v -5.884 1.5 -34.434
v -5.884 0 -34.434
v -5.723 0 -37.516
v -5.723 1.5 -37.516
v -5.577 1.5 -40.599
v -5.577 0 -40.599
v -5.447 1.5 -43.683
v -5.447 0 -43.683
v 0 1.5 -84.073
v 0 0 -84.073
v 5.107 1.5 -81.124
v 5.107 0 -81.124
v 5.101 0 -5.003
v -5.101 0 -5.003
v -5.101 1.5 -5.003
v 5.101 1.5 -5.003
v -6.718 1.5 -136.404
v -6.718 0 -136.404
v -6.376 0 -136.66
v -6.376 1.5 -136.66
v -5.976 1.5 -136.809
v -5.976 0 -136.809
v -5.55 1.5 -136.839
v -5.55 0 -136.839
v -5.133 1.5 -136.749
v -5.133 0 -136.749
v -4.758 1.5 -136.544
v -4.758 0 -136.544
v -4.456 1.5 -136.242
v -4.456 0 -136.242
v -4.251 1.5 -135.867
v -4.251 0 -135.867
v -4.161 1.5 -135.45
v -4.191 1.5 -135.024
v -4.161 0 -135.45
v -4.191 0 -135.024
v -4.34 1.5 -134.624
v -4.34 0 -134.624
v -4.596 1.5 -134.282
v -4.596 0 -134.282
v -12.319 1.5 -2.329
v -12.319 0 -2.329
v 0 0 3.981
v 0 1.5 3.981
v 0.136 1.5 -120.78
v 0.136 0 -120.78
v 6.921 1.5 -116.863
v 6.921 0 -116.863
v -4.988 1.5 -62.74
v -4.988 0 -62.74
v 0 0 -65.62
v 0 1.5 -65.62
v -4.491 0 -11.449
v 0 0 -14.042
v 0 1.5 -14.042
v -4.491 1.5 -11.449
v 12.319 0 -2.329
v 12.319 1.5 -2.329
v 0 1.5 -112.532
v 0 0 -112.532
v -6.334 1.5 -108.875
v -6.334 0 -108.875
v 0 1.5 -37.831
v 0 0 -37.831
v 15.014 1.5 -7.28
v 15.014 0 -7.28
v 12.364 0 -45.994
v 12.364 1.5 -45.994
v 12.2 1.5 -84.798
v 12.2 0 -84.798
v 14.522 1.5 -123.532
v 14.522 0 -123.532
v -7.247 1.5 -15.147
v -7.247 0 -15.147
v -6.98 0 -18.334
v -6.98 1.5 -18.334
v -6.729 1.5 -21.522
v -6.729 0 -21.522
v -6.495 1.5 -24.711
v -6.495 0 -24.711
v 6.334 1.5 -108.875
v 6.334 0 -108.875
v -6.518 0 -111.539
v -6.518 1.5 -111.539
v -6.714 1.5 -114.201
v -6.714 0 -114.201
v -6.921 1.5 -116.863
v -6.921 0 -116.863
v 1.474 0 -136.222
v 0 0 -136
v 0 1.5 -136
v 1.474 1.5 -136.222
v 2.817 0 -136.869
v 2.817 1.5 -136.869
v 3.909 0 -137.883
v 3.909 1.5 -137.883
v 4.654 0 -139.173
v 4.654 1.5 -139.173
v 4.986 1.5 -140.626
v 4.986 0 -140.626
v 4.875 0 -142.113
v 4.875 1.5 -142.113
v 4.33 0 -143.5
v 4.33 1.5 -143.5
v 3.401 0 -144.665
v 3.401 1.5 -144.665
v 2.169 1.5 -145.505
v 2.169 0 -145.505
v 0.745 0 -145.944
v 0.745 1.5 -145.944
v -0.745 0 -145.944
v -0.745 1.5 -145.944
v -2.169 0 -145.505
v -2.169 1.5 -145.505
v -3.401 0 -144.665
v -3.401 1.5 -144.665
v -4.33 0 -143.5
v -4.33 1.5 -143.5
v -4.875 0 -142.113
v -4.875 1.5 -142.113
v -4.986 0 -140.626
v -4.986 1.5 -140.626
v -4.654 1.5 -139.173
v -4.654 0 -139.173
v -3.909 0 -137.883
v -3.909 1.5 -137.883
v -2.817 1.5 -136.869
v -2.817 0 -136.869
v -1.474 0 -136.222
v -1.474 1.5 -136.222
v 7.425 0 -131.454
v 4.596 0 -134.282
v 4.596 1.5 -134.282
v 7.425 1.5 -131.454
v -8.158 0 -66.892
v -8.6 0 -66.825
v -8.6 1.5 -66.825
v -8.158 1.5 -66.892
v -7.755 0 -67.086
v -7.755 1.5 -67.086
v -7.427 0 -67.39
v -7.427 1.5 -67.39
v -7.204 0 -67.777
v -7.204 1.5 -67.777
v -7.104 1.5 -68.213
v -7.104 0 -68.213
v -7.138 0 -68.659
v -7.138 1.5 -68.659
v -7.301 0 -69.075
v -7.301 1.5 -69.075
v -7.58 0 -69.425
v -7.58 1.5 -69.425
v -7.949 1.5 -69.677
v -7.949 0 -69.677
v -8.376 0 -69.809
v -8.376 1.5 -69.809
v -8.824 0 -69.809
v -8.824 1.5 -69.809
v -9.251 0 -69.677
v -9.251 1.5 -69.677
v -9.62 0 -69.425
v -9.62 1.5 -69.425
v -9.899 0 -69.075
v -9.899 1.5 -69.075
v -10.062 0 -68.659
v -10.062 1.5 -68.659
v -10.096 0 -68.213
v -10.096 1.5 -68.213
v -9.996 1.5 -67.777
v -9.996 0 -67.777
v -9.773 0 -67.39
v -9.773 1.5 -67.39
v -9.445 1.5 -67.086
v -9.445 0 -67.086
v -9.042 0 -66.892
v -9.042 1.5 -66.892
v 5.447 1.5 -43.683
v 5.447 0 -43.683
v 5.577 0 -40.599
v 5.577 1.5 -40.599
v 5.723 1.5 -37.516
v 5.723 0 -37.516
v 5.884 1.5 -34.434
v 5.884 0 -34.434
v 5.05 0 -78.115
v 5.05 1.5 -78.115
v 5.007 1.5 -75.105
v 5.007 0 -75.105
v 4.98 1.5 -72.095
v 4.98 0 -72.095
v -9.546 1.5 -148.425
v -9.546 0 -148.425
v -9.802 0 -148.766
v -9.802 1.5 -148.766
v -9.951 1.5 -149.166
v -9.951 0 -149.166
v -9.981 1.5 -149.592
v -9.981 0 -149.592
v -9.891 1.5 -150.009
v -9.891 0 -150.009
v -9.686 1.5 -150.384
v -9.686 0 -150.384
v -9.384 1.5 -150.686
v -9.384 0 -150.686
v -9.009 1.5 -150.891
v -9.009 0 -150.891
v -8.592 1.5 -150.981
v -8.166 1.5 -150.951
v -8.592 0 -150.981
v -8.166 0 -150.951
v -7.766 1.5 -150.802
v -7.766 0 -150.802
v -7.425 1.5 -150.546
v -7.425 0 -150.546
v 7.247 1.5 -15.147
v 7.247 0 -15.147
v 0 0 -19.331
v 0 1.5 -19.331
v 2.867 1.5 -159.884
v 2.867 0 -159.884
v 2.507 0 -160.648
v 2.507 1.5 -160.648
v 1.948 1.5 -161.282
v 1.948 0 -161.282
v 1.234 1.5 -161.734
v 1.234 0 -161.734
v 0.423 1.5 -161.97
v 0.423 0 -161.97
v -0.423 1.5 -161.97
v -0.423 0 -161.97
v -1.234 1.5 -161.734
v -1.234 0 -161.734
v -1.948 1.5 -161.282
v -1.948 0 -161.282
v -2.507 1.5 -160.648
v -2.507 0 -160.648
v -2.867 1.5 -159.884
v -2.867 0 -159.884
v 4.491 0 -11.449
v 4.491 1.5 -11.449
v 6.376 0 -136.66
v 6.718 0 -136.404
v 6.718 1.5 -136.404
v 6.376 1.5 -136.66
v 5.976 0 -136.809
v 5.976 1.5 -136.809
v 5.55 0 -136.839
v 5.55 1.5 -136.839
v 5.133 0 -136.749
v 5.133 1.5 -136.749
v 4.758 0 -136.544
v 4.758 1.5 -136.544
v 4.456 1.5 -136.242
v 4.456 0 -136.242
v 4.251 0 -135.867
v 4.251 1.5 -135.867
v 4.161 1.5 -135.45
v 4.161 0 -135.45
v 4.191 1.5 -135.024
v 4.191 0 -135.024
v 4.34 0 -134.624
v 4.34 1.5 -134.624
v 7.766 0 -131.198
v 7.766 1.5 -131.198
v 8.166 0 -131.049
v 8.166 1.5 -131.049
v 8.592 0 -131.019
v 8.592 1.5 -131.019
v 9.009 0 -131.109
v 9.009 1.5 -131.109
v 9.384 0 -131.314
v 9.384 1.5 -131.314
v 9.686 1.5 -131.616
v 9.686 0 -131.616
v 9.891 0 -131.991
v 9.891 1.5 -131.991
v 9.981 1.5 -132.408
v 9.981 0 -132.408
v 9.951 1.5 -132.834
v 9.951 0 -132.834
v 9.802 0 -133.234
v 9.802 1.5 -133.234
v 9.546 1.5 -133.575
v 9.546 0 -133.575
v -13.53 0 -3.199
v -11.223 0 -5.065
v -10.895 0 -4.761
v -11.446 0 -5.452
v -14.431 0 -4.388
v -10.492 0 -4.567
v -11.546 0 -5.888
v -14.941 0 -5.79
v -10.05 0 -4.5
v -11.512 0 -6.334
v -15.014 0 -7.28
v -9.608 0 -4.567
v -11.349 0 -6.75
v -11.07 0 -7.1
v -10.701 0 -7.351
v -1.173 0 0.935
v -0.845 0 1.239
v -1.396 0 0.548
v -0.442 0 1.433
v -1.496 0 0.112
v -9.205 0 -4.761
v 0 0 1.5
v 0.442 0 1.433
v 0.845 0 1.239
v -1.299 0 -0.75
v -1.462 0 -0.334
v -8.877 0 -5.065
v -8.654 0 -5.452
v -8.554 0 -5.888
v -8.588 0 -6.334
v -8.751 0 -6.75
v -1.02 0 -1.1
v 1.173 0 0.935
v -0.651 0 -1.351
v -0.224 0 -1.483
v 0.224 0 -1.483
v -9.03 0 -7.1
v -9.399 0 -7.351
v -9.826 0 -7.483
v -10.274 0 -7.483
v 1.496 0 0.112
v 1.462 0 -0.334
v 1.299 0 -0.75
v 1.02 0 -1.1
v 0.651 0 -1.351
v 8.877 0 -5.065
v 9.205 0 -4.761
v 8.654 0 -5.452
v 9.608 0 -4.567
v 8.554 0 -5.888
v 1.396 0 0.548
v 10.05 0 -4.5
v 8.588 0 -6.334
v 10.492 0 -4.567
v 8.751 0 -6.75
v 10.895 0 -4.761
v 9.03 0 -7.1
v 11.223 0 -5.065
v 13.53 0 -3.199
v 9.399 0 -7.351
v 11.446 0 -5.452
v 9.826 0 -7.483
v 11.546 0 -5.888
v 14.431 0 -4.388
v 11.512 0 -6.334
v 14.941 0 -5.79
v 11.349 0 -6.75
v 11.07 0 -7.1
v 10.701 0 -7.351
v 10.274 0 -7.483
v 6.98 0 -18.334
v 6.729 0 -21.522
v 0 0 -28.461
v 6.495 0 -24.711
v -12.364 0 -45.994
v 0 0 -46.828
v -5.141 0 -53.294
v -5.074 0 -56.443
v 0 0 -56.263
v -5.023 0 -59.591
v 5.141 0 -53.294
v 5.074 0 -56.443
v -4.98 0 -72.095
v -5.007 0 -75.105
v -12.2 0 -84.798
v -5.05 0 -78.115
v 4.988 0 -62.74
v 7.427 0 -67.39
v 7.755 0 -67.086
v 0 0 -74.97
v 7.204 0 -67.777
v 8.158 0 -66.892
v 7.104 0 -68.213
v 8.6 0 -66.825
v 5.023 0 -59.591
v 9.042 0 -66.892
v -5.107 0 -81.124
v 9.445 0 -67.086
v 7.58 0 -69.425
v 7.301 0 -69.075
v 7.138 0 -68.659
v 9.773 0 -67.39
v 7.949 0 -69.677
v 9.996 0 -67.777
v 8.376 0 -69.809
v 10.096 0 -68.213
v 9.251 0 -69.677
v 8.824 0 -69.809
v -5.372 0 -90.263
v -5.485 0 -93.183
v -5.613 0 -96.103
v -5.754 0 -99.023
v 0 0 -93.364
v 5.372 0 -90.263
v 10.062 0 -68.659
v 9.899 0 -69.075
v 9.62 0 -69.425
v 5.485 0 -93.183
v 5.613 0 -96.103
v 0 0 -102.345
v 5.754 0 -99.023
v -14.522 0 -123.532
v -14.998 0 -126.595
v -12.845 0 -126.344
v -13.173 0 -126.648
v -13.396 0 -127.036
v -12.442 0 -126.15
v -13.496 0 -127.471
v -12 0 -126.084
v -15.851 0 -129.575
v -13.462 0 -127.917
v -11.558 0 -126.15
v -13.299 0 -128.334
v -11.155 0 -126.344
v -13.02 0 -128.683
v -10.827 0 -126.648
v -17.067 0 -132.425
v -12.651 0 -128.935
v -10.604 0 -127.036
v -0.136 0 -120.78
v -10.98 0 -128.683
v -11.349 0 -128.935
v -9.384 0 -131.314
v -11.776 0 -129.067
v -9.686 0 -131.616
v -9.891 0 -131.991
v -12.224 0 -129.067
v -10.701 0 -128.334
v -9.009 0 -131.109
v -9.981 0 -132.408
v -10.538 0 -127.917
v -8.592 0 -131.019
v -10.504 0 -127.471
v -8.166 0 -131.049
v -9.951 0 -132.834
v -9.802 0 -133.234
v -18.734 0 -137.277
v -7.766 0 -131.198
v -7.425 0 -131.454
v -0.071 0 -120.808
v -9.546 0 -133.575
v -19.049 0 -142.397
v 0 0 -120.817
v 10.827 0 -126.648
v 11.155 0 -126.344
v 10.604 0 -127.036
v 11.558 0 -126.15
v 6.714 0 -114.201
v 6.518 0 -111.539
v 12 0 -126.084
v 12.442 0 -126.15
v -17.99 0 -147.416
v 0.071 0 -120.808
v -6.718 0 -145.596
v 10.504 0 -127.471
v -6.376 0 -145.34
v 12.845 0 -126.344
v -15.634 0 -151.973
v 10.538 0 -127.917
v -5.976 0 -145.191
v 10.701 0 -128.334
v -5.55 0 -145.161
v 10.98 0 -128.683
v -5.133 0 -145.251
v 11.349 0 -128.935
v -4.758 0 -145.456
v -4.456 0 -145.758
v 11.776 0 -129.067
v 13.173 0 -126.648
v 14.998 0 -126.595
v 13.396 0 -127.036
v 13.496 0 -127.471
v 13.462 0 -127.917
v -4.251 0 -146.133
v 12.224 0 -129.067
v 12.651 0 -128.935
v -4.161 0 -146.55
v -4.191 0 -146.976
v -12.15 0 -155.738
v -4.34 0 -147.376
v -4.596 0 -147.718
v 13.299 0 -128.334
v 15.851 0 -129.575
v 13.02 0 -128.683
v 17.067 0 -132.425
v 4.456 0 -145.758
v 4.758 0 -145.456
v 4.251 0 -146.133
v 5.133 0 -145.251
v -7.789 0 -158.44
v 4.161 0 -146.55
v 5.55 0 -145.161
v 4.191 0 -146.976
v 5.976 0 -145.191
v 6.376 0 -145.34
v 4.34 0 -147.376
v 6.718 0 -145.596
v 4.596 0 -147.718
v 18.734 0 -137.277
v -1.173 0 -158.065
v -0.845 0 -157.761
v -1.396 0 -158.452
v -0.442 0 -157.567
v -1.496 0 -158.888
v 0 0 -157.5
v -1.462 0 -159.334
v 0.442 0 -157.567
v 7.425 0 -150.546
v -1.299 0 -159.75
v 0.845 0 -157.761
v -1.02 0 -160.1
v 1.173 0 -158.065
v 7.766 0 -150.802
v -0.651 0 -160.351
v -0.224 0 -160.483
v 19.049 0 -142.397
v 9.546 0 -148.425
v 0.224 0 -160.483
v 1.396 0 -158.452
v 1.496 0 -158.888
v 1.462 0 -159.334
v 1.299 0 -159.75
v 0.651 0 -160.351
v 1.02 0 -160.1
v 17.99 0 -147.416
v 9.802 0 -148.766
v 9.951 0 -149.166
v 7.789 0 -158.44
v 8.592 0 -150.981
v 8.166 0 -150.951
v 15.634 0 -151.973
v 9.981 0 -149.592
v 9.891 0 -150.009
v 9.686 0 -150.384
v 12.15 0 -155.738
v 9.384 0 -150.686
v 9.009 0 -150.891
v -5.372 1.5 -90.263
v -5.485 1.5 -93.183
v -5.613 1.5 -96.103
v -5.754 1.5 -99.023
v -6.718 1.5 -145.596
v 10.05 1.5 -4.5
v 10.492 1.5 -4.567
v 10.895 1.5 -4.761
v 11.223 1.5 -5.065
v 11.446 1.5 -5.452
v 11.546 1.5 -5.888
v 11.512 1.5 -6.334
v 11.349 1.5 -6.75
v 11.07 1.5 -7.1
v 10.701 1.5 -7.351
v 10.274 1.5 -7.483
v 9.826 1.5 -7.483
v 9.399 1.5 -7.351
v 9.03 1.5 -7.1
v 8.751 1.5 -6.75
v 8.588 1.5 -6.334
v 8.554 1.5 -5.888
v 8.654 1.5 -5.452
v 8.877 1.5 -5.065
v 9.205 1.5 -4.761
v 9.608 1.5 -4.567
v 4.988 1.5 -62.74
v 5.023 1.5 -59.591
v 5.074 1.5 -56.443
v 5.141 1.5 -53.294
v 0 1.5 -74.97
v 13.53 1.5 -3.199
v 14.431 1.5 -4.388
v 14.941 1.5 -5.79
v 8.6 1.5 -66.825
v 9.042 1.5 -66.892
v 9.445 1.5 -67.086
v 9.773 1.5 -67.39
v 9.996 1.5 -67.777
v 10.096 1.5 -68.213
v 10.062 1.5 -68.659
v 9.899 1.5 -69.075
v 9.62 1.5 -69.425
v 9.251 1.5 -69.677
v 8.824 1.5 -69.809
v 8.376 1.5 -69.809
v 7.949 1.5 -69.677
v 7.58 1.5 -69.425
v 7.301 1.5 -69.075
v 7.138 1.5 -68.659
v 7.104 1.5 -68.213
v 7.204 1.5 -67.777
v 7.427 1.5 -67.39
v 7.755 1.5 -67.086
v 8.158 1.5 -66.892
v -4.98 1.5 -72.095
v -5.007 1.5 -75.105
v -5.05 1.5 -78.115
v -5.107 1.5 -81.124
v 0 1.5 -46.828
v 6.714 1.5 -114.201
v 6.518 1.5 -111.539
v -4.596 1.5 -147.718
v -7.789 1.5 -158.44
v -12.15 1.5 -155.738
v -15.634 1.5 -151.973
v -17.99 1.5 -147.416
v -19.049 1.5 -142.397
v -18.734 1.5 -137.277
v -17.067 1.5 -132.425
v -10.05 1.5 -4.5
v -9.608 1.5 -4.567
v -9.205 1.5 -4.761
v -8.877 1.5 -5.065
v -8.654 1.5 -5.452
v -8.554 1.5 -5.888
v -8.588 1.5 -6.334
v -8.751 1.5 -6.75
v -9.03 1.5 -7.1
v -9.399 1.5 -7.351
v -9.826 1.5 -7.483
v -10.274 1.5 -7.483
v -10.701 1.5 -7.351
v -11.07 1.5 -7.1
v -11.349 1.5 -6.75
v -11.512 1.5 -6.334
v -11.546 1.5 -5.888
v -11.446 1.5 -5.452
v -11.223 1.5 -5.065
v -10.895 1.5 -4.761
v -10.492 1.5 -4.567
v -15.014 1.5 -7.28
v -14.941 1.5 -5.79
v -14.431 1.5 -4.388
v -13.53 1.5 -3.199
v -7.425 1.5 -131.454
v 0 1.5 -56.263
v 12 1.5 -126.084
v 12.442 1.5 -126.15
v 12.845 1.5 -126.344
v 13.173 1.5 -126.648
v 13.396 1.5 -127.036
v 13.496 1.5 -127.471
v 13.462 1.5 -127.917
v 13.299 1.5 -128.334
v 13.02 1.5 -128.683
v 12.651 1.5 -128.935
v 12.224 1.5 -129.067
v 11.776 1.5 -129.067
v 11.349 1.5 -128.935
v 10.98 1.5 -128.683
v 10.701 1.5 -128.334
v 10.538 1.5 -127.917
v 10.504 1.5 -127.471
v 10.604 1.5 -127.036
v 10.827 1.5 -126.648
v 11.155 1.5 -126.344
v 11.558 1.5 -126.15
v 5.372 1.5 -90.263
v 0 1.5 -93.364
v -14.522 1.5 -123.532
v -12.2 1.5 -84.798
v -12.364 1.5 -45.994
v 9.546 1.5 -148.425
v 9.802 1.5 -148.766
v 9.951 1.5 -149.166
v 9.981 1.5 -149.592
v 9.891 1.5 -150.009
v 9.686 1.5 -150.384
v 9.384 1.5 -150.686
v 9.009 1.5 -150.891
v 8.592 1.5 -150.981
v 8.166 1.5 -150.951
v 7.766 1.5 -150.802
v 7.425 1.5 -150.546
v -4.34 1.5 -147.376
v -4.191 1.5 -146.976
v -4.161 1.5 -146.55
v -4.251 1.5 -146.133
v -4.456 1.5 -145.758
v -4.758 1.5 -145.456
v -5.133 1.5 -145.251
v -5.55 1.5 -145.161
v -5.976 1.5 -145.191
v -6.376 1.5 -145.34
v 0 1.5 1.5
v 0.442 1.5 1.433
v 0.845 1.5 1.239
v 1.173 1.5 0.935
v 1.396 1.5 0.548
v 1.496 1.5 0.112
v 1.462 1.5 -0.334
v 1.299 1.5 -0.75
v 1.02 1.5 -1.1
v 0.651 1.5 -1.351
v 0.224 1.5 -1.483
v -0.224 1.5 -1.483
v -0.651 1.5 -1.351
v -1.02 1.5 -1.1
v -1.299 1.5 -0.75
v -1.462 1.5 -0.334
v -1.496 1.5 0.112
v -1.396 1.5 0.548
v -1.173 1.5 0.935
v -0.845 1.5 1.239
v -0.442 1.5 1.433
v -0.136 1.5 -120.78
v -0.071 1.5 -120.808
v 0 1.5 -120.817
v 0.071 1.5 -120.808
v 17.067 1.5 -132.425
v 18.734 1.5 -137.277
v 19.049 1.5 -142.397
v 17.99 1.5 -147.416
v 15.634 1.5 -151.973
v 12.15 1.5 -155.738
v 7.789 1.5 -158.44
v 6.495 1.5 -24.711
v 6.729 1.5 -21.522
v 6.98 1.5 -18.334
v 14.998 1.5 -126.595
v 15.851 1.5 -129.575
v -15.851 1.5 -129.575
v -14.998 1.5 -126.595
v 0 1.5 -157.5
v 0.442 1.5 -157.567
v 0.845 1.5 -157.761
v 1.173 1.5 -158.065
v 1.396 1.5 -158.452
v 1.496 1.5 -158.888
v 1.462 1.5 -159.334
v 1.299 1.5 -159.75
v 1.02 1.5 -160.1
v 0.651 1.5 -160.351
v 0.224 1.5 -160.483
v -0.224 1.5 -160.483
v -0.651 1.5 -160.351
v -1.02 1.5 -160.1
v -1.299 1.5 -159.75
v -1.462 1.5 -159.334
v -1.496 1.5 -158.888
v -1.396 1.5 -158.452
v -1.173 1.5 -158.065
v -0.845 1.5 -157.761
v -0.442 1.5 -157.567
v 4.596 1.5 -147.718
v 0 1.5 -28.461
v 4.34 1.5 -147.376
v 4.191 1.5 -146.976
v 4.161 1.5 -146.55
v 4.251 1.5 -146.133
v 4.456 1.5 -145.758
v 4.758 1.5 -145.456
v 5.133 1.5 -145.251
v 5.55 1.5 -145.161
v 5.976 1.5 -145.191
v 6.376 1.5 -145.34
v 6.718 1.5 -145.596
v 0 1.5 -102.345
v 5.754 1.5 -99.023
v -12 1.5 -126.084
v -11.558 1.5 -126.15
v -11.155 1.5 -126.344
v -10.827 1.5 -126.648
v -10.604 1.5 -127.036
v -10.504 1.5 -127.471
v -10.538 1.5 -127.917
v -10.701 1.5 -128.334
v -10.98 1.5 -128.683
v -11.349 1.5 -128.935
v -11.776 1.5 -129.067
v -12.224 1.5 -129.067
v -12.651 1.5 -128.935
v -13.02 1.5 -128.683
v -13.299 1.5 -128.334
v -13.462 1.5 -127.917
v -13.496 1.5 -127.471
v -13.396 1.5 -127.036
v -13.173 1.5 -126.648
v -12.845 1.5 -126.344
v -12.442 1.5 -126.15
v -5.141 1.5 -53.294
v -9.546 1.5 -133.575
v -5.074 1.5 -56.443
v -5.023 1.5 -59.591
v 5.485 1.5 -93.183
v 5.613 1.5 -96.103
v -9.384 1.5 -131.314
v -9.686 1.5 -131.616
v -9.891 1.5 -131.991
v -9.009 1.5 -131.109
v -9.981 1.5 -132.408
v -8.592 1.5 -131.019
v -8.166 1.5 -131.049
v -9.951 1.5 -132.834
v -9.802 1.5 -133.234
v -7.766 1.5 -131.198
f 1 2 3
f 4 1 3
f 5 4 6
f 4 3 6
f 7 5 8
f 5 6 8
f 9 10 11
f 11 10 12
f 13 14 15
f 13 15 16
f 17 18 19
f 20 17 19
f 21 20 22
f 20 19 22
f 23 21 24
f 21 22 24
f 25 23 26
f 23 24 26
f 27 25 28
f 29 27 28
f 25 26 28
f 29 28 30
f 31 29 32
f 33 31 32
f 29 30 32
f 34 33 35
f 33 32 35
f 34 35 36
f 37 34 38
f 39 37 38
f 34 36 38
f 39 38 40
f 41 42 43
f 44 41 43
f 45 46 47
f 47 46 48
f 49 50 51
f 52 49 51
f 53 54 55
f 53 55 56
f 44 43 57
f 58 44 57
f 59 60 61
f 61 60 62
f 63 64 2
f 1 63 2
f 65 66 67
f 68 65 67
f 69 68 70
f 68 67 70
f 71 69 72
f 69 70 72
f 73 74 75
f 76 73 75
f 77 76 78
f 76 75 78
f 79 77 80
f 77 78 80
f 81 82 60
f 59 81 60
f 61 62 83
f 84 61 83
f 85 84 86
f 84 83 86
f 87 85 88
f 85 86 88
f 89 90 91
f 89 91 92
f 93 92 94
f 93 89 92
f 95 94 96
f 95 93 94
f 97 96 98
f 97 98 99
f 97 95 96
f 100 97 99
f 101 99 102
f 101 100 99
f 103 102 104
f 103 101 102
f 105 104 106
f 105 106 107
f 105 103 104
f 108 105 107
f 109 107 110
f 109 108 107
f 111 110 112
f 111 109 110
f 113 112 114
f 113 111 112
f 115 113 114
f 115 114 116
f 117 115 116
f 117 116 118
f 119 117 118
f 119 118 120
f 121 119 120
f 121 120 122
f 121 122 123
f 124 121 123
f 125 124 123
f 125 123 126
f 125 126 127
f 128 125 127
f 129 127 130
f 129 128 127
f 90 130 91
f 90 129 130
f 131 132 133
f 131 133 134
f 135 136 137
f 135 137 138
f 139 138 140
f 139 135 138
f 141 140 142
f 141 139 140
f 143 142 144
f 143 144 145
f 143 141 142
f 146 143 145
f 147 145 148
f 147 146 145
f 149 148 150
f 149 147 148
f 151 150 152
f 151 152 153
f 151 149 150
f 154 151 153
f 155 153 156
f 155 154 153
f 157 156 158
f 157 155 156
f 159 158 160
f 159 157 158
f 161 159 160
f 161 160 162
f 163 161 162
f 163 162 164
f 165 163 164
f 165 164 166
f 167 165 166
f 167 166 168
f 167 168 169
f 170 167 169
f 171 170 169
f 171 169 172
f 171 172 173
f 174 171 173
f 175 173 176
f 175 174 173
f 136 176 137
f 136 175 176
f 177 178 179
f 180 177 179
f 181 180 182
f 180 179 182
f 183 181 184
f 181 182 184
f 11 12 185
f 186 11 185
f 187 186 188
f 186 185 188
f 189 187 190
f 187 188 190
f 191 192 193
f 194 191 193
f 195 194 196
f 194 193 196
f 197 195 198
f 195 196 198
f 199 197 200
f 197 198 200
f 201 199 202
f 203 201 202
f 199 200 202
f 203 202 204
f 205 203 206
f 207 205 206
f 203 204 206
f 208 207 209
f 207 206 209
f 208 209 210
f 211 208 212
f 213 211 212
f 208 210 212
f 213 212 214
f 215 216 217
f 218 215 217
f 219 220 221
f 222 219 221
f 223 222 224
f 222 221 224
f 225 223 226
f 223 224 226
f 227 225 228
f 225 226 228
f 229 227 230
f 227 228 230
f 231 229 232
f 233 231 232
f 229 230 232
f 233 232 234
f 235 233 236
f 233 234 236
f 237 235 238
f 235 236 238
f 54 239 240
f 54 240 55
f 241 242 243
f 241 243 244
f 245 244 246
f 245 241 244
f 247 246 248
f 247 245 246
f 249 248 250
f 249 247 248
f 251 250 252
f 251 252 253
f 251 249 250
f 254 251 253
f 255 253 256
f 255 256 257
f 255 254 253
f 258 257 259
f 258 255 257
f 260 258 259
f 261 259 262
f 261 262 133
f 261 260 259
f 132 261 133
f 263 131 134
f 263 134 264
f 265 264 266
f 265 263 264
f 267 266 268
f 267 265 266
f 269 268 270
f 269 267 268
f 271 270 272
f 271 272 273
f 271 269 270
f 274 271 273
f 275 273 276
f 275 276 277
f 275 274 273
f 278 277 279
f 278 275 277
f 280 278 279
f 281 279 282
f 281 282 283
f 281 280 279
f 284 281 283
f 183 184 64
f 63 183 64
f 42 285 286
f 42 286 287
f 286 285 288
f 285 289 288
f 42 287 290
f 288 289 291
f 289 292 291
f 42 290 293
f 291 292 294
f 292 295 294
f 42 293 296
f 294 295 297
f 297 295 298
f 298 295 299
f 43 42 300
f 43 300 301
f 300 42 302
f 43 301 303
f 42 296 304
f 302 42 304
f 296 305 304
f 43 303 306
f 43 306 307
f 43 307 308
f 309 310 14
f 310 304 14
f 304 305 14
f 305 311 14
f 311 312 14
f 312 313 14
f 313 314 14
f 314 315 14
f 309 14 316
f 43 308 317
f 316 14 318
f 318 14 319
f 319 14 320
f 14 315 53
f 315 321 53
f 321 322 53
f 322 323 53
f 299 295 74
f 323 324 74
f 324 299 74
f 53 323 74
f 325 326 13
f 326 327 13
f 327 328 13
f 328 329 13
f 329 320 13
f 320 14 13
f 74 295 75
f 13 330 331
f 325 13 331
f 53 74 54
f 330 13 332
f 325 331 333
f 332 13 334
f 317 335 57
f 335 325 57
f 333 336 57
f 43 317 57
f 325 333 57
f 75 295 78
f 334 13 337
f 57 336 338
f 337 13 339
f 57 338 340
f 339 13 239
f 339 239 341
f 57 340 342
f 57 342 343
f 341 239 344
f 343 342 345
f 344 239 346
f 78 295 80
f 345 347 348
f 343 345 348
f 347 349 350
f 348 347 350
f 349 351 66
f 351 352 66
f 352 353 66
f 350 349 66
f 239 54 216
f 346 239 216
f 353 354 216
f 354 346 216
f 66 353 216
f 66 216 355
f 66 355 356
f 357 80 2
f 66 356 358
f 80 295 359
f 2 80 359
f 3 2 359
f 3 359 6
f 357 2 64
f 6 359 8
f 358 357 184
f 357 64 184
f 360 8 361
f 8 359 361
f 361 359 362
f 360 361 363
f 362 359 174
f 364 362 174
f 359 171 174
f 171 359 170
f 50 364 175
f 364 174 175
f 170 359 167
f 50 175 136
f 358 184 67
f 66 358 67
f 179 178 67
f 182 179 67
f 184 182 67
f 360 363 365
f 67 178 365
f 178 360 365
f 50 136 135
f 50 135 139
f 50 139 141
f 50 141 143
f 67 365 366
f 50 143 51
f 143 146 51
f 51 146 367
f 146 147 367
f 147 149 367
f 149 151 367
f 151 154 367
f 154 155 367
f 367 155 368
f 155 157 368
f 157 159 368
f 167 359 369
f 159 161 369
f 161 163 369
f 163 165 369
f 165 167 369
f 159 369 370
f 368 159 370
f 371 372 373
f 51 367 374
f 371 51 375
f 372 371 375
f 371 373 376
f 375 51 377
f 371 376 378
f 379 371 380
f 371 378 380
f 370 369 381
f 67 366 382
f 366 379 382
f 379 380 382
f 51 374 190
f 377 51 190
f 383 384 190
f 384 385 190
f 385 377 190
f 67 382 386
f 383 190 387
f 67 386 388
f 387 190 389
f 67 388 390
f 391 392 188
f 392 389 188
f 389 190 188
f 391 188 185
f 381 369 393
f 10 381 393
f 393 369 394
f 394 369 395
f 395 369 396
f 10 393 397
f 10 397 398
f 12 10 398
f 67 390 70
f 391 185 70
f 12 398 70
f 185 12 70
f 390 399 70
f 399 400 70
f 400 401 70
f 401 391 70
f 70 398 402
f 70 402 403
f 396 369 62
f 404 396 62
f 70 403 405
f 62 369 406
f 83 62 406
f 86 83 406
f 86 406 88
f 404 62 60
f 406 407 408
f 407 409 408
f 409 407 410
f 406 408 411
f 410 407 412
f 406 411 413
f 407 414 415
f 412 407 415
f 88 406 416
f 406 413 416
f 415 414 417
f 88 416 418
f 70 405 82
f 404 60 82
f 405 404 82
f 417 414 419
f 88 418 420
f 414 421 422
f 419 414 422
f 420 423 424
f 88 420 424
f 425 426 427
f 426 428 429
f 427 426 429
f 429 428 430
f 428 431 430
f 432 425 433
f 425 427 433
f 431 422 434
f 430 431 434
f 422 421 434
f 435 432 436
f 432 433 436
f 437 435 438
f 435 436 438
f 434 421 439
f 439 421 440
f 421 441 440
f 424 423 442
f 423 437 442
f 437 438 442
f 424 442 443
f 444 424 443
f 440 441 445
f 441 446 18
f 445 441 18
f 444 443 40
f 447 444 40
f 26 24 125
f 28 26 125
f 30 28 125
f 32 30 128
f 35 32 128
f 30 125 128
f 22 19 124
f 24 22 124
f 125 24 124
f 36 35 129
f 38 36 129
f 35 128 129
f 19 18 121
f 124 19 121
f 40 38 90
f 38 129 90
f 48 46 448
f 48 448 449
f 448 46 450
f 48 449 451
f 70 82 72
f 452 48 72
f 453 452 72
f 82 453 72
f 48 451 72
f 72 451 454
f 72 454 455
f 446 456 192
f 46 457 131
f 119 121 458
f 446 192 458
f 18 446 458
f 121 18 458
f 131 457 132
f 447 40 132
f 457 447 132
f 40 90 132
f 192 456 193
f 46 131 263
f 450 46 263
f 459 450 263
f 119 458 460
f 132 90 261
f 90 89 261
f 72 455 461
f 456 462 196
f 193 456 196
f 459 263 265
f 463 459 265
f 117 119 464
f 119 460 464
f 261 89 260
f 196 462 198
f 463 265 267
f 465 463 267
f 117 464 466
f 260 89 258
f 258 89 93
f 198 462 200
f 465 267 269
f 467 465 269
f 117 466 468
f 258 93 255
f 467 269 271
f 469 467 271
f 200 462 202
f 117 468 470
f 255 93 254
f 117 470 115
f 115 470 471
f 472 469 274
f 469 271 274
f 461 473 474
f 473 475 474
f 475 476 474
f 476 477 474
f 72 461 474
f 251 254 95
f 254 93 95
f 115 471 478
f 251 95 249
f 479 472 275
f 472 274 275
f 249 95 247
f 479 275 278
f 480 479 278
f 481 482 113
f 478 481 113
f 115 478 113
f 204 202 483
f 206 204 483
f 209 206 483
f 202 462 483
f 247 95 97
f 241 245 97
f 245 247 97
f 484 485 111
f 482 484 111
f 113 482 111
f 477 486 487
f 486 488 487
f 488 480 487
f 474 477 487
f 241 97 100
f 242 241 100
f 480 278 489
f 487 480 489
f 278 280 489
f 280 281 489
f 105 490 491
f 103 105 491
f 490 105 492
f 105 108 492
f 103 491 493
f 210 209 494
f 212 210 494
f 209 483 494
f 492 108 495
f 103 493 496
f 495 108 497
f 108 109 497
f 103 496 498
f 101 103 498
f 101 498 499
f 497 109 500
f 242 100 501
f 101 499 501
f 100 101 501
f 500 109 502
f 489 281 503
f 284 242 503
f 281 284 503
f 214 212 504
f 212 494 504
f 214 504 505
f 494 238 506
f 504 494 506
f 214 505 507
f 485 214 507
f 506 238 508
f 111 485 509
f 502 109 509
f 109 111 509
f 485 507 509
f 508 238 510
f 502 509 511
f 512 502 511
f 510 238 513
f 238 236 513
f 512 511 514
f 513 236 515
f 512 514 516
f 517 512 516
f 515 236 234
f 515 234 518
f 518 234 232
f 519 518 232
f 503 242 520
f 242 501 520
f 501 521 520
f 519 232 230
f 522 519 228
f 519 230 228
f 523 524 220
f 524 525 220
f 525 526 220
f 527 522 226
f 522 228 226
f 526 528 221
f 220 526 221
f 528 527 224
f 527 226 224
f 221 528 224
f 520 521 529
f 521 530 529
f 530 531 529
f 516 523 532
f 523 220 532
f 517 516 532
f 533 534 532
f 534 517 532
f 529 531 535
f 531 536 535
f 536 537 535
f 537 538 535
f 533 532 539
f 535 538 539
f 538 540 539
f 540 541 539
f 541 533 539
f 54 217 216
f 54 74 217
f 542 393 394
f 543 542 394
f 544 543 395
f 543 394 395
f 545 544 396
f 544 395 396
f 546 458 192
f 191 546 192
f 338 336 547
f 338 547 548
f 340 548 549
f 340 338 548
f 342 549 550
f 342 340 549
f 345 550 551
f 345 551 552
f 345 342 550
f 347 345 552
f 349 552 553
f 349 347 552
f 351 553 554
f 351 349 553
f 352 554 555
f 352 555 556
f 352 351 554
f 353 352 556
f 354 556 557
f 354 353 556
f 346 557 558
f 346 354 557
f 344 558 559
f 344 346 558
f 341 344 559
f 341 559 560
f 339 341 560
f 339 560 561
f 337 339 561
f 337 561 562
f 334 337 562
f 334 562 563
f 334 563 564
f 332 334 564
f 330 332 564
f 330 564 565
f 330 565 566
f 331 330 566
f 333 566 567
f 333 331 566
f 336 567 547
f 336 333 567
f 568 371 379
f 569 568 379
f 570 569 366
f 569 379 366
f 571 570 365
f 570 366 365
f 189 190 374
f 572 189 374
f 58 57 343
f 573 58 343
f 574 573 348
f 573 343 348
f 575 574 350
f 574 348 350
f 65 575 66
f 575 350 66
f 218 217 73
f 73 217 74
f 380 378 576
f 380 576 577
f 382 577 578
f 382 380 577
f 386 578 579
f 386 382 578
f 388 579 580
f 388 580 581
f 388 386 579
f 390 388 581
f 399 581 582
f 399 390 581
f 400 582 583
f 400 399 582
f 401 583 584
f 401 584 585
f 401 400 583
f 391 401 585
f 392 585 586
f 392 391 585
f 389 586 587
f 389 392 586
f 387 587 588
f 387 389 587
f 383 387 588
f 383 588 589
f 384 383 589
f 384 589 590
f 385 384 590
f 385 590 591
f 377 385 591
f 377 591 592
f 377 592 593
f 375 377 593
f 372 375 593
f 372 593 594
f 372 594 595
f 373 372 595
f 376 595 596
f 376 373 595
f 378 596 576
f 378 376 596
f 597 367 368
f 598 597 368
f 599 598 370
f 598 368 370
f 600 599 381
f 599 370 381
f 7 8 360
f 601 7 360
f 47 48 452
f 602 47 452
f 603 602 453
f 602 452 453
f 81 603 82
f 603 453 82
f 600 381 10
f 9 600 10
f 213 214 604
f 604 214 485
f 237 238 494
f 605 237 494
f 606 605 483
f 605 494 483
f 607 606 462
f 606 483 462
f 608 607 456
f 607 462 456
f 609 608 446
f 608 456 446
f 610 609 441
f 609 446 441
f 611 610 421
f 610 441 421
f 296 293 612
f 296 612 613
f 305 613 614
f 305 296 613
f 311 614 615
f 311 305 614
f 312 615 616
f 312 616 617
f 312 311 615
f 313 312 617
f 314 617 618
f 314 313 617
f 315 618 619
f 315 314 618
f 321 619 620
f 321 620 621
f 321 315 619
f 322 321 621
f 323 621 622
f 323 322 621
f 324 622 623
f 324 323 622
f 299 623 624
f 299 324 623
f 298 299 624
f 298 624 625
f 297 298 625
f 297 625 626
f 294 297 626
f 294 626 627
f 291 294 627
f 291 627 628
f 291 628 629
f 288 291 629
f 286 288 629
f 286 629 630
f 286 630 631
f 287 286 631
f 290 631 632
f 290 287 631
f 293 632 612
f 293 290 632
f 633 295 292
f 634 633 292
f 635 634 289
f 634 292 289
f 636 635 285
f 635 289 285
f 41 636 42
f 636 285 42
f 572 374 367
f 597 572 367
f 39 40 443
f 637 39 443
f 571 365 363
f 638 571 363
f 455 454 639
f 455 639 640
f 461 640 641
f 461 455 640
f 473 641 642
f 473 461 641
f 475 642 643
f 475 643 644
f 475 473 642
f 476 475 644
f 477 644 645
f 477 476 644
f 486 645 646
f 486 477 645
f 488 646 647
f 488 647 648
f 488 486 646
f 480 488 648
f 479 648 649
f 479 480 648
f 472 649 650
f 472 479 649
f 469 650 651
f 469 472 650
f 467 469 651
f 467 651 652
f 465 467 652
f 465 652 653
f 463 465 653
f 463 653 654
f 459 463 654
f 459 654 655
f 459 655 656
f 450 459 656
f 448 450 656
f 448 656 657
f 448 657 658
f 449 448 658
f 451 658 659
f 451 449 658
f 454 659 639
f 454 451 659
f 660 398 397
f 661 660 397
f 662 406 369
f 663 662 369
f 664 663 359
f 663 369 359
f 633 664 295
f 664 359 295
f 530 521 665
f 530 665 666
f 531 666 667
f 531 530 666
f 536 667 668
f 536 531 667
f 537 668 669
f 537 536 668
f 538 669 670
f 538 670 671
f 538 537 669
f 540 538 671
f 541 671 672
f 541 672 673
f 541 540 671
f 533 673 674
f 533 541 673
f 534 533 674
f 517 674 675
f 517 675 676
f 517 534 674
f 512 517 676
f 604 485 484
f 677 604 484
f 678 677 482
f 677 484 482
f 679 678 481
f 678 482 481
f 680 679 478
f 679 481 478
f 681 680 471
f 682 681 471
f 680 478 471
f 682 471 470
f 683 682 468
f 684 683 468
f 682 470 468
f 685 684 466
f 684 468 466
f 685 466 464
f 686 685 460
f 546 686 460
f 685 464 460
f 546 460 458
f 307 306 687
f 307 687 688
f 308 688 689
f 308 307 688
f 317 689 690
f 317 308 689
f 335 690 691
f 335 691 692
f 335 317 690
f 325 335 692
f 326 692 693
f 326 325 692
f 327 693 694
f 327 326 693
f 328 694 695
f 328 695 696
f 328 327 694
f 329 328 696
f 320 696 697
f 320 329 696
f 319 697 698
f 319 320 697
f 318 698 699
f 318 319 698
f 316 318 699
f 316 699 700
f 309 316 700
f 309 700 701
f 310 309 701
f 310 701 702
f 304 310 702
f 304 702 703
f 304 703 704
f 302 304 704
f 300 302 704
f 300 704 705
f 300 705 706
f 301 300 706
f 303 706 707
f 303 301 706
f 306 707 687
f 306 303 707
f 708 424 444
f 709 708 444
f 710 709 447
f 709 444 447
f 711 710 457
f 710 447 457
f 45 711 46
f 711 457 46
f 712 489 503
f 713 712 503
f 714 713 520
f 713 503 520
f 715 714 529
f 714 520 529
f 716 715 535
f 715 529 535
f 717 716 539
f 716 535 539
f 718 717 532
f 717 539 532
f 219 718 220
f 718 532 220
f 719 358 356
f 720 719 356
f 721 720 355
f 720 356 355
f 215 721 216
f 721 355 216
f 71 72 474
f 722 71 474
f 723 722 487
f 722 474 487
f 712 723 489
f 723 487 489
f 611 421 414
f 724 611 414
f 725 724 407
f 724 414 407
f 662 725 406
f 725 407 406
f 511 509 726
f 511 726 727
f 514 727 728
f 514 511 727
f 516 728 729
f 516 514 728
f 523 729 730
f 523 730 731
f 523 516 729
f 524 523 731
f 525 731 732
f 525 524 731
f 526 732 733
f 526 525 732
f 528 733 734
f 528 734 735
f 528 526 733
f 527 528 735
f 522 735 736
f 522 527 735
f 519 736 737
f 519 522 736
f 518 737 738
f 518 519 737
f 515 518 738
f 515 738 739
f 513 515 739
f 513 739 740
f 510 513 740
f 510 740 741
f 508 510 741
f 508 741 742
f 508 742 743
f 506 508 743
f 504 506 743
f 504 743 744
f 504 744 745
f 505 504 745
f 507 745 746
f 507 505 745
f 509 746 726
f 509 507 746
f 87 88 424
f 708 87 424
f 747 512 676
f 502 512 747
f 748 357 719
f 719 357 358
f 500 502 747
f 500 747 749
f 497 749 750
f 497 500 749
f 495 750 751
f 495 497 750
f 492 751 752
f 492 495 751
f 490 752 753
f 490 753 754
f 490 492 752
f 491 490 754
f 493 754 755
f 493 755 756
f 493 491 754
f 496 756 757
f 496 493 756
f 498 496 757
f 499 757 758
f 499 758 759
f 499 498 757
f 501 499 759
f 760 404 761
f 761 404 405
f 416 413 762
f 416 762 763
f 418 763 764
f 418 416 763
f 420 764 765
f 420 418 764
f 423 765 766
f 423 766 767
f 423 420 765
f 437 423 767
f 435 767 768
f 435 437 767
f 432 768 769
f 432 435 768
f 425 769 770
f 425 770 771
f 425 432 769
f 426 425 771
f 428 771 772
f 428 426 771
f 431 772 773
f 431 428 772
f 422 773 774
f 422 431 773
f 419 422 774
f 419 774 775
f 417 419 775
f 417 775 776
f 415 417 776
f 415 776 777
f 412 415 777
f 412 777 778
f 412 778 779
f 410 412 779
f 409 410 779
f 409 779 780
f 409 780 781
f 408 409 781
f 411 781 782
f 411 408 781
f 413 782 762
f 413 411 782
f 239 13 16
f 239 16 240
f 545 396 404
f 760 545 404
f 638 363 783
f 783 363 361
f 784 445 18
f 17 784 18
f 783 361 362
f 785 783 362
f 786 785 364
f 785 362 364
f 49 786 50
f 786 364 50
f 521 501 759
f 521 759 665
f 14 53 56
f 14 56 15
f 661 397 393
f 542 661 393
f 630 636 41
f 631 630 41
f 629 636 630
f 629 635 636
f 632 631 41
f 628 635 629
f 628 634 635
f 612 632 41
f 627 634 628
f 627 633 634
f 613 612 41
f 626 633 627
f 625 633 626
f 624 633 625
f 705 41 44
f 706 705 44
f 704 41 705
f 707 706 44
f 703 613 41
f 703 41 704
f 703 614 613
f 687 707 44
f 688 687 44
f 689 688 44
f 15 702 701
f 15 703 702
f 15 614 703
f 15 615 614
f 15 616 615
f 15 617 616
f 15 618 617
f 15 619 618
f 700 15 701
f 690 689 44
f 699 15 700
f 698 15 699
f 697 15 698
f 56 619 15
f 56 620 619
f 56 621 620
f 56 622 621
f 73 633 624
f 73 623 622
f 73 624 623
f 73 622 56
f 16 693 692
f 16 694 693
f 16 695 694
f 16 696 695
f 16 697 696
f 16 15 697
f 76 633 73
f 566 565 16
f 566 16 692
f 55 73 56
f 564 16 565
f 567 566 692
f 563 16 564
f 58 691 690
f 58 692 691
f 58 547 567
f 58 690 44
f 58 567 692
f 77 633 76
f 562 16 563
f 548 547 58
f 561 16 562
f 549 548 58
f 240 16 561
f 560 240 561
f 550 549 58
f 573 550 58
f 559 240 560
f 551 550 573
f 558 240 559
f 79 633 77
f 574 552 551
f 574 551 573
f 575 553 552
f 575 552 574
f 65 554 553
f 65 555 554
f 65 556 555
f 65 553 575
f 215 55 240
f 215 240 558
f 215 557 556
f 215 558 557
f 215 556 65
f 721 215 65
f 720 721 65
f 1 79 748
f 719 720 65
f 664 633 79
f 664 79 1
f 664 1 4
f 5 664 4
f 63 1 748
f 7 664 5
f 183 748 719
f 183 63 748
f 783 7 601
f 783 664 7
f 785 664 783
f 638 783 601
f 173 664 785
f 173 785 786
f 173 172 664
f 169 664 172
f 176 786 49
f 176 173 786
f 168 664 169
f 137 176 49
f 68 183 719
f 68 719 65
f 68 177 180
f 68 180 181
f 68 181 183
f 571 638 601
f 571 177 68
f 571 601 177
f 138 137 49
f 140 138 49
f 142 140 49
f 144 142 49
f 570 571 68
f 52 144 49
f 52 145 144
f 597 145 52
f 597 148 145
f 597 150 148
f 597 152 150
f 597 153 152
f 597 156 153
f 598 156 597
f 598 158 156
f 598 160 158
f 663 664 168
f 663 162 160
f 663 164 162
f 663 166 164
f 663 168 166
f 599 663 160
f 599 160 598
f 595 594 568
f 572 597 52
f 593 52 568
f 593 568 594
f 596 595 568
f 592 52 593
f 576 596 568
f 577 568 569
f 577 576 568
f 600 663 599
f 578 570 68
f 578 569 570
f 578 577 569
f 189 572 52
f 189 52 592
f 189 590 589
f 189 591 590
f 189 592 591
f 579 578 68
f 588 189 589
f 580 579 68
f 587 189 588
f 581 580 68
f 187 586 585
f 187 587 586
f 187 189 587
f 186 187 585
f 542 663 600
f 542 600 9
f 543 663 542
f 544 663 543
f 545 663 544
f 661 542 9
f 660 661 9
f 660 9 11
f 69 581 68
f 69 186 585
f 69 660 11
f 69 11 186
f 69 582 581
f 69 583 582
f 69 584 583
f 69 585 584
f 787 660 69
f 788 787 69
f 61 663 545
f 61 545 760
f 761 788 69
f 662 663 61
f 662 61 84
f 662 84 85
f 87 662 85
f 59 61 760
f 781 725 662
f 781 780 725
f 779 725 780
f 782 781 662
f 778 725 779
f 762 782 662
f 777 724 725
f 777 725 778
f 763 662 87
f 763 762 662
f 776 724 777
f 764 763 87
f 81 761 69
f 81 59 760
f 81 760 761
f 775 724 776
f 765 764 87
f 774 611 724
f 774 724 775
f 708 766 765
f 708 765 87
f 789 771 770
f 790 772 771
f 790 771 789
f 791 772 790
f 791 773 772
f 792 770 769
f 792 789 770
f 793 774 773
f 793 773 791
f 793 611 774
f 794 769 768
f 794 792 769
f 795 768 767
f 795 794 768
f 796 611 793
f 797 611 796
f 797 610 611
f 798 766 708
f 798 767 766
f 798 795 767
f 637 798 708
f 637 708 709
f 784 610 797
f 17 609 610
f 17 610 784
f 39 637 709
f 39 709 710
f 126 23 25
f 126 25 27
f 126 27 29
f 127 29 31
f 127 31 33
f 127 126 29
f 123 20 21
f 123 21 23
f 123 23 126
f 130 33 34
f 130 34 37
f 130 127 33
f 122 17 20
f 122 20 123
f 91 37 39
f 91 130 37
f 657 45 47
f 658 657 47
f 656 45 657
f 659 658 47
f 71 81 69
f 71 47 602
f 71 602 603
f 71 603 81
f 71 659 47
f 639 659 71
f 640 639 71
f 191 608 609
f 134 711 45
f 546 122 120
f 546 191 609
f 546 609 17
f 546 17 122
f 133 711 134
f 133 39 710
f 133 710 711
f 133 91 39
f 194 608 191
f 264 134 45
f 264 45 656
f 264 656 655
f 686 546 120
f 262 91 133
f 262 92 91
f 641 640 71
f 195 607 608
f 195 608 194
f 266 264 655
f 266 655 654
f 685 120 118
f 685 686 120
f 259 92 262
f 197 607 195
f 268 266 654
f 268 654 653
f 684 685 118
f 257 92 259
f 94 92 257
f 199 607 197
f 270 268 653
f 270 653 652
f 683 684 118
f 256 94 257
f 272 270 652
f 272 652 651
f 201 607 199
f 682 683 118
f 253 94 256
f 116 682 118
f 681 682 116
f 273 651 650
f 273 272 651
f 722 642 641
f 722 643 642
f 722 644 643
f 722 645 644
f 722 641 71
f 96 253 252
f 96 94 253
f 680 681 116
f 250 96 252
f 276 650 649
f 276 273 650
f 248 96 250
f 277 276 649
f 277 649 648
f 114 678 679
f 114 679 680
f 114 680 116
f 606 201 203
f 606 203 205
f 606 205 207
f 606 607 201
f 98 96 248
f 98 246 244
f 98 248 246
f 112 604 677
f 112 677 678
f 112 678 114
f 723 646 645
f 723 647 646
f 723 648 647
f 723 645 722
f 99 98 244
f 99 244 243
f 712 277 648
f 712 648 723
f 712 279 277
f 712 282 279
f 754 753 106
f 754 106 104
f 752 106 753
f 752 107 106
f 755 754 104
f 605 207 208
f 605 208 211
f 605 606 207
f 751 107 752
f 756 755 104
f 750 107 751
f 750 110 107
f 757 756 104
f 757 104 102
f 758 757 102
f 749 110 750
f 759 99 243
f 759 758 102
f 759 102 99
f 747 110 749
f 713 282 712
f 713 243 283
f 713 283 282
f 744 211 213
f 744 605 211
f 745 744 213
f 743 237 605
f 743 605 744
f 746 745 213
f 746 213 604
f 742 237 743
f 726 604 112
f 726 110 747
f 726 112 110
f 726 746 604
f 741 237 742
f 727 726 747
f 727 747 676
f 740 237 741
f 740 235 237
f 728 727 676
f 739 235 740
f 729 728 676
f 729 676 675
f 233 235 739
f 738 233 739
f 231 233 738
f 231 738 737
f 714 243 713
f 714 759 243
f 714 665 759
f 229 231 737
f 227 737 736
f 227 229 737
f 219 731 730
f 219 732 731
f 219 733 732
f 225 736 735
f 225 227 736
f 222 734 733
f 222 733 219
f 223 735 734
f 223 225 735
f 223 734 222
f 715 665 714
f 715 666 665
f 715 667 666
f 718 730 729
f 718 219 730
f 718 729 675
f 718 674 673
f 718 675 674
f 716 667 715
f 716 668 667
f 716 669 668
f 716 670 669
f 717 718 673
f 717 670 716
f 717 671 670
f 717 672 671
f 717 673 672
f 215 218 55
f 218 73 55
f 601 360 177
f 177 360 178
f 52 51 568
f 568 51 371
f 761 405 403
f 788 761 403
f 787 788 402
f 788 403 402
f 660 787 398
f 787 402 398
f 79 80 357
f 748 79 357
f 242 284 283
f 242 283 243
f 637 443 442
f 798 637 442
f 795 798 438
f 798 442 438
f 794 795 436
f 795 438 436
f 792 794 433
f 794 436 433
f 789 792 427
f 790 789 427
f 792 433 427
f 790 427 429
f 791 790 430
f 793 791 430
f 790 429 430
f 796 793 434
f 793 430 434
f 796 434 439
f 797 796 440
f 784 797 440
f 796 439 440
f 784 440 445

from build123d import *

# Parameters (mm, degrees)
SKETCH_1_R      = 1.5
SKETCH_1_R_2    = 5
EXTRUDE_1_DEPTH = 1.5


with BuildPart() as part:
    # 草圖1 → 填料-伸長1 (new body)
    with BuildSketch(Plane(origin=(0, 0, 0), x_dir=(1, 0, 0), z_dir=(0, 1, 0))):
        with BuildLine():
            Line((0, -3.980931511), (12.319060855, 2.328849967))
            ThreePointArc((12.319060855, 2.328849967), (14.431141465, 4.388450613), (15.014493405, 7.28025625))
            ThreePointArc((15.014493405, 7.28025625), (11.971039141, 65.394509034), (14.52184689, 123.53246884))
            ThreePointArc((14.52184689, 123.53246884), (15.377876917, 128.098069479), (17.067022361, 132.425226083))
            ThreePointArc((17.067022361, 132.425226083), (16.965589985, 149.77375384), (2.866920195, 159.883611111))
            ThreePointArc((2.866920195, 159.883611111), (0, 162), (-2.866920195, 159.883611111))
            ThreePointArc((-2.866920195, 159.883611111), (-16.965589985, 149.77375384), (-17.067022361, 132.425226083))
            ThreePointArc((-17.067022361, 132.425226083), (-15.377876917, 128.098069479), (-14.52184689, 123.53246884))
            ThreePointArc((-14.52184689, 123.53246884), (-11.971039141, 65.394509034), (-15.014493405, 7.28025625))
            ThreePointArc((-15.014493405, 7.28025625), (-14.431141465, 4.388450613), (-12.319060855, 2.328849967))
            Line((-12.319060855, 2.328849967), (0, -3.980931511))
        make_face()
        with Locations(Location((-12, 127.583592135, 0), (0, 0, 270))):
            Circle(SKETCH_1_R, mode=Mode.SUBTRACT)
        with Locations(Location((12, 127.583592135, 0), (0, 0, 270))):
            Circle(SKETCH_1_R, mode=Mode.SUBTRACT)
        with Locations(Location((8.6, 68.325395665, 0), (0, 0, 270))):
            Circle(SKETCH_1_R, mode=Mode.SUBTRACT)
        with Locations(Location((-8.6, 68.325395665, 0), (0, 0, 270))):
            Circle(SKETCH_1_R, mode=Mode.SUBTRACT)
        with Locations(Location((10.05, 6, 0), (0, 0, 270))):
            Circle(SKETCH_1_R, mode=Mode.SUBTRACT)
        with Locations(Location((-10.05, 6, 0), (0, 0, 270))):
            Circle(SKETCH_1_R, mode=Mode.SUBTRACT)
        with Locations(Location((0, 159, 0), (0, 0, 270))):
            Circle(SKETCH_1_R, mode=Mode.SUBTRACT)
        with Locations(Location((0, 0, 0), (0, 0, 270))):
            Circle(SKETCH_1_R, mode=Mode.SUBTRACT)
        with Locations(Location((0, 141, 0), (0, 0, 270))):
            Circle(SKETCH_1_R_2, mode=Mode.SUBTRACT)
        Polygon((0, 14.042409585), (-4.491071946, 11.449487988), (-5.101164168, 5.002829556), (5.101164168, 5.002829556), (4.491071946, 11.449487988), align=None, mode=Mode.SUBTRACT)
        with BuildLine():
            Line((0, 112.532142135), (-6.334048162, 108.875177723))
            ThreePointArc((-6.334048162, 108.875177723), (-6.614696141, 112.870067669), (-6.92146425, 116.863036776))
            Line((-6.92146425, 116.863036776), (-0.136378432, 120.780407899))
            ThreePointArc((-0.136378432, 120.780407899), (0, 120.816950389), (0.136378432, 120.780407899))
            Line((0.136378432, 120.780407899), (6.92146425, 116.863036776))
            ThreePointArc((6.92146425, 116.863036776), (6.614696141, 112.870067669), (6.334048162, 108.875177723))
            Line((6.334048162, 108.875177723), (0, 112.532142135))
        make_face(mode=Mode.SUBTRACT)
        with BuildLine():
            Line((0, 102.344922167), (5.753985291, 99.02285721))
            ThreePointArc((5.753985291, 99.02285721), (5.547257407, 94.643430297), (5.371890331, 90.262635518))
            Line((5.371890331, 90.262635518), (0, 93.364097846))
            Line((0, 93.364097846), (-5.371890331, 90.262635518))
            ThreePointArc((-5.371890331, 90.262635518), (-5.547257407, 94.643430297), (-5.753985291, 99.02285721))
            Line((-5.753985291, 99.02285721), (0, 102.344922167))
        make_face(mode=Mode.SUBTRACT)
        with BuildLine():
            Line((0, 84.072725452), (5.10712289, 81.124126676))
            ThreePointArc((5.10712289, 81.124126676), (5.026699976, 76.609736924), (4.97956534, 72.094876904))
            Line((4.97956534, 72.094876904), (0, 74.969830293))
            Line((0, 74.969830293), (-4.97956534, 72.094876904))
            ThreePointArc((-4.97956534, 72.094876904), (-5.026699976, 76.609736924), (-5.10712289, 81.124126676))
            Line((-5.10712289, 81.124126676), (0, 84.072725452))
        make_face(mode=Mode.SUBTRACT)
        with BuildLine():
            Line((0, 65.619773758), (4.987851065, 62.740036603))
            ThreePointArc((4.987851065, 62.740036603), (5.046332025, 58.016878131), (5.141244155, 53.29431128))
            Line((5.141244155, 53.29431128), (0, 56.262609977))
            Line((0, 56.262609977), (-5.141244155, 53.29431128))
            ThreePointArc((-5.141244155, 53.29431128), (-5.046332025, 58.016878131), (-4.987851065, 62.740036603))
            Line((-4.987851065, 62.740036603), (0, 65.619773758))
        make_face(mode=Mode.SUBTRACT)
        with BuildLine():
            Line((0, 46.827706802), (5.447027498, 43.68286401))
            ThreePointArc((5.447027498, 43.68286401), (5.648052955, 39.057684109), (5.884040018, 34.434156186))
            Line((5.884040018, 34.434156186), (0, 37.831308275))
            Line((0, 37.831308275), (-5.884040018, 34.434156186))
            ThreePointArc((-5.884040018, 34.434156186), (-5.648052955, 39.057684109), (-5.447027498, 43.68286401))
            Line((-5.447027498, 43.68286401), (0, 46.827706802))
        make_face(mode=Mode.SUBTRACT)
        with BuildLine():
            Line((0, 28.460830008), (6.494782795, 24.711065414))
            ThreePointArc((6.494782795, 24.711065414), (6.852315766, 19.927479382), (7.247310233, 15.146840877))
            Line((7.247310233, 15.146840877), (0, 19.331077391))
            Line((0, 19.331077391), (-7.247310233, 15.146840877))
            ThreePointArc((-7.247310233, 15.146840877), (-6.852315766, 19.927479382), (-6.494782795, 24.711065414))
            Line((-6.494782795, 24.711065414), (0, 28.460830008))
        make_face(mode=Mode.SUBTRACT)
        with BuildLine():
            Line((-6.717514421, 145.596194078), (-9.545941546, 148.424621202))
            ThreePointArc((-9.545941546, 148.424621202), (-9.545941546, 150.545941546), (-7.424621202, 150.545941546))
            Line((-7.424621202, 150.545941546), (-4.596194078, 147.717514421))
            ThreePointArc((-4.596194078, 147.717514421), (-4.596194078, 145.596194078), (-6.717514421, 145.596194078))
        make_face(mode=Mode.SUBTRACT)
        with BuildLine():
            Line((6.717514421, 145.596194078), (9.545941546, 148.424621202))
            ThreePointArc((9.545941546, 148.424621202), (9.545941546, 150.545941546), (7.424621202, 150.545941546))
            Line((7.424621202, 150.545941546), (4.596194078, 147.717514421))
            ThreePointArc((4.596194078, 147.717514421), (4.596194078, 145.596194078), (6.717514421, 145.596194078))
        make_face(mode=Mode.SUBTRACT)
        with BuildLine():
            Line((-4.596194078, 134.282485579), (-7.424621202, 131.454058454))
            ThreePointArc((-7.424621202, 131.454058454), (-9.545941546, 131.454058454), (-9.545941546, 133.575378798))
            Line((-9.545941546, 133.575378798), (-6.717514421, 136.403805922))
            ThreePointArc((-6.717514421, 136.403805922), (-4.596194078, 136.403805922), (-4.596194078, 134.282485579))
        make_face(mode=Mode.SUBTRACT)
        with BuildLine():
            Line((4.596194078, 134.282485579), (7.424621202, 131.454058454))
            ThreePointArc((7.424621202, 131.454058454), (9.545941546, 131.454058454), (9.545941546, 133.575378798))
            Line((9.545941546, 133.575378798), (6.717514421, 136.403805922))
            ThreePointArc((6.717514421, 136.403805922), (4.596194078, 136.403805922), (4.596194078, 134.282485579))
        make_face(mode=Mode.SUBTRACT)
    extrude(amount=EXTRUDE_1_DEPTH)


solid = part.part
